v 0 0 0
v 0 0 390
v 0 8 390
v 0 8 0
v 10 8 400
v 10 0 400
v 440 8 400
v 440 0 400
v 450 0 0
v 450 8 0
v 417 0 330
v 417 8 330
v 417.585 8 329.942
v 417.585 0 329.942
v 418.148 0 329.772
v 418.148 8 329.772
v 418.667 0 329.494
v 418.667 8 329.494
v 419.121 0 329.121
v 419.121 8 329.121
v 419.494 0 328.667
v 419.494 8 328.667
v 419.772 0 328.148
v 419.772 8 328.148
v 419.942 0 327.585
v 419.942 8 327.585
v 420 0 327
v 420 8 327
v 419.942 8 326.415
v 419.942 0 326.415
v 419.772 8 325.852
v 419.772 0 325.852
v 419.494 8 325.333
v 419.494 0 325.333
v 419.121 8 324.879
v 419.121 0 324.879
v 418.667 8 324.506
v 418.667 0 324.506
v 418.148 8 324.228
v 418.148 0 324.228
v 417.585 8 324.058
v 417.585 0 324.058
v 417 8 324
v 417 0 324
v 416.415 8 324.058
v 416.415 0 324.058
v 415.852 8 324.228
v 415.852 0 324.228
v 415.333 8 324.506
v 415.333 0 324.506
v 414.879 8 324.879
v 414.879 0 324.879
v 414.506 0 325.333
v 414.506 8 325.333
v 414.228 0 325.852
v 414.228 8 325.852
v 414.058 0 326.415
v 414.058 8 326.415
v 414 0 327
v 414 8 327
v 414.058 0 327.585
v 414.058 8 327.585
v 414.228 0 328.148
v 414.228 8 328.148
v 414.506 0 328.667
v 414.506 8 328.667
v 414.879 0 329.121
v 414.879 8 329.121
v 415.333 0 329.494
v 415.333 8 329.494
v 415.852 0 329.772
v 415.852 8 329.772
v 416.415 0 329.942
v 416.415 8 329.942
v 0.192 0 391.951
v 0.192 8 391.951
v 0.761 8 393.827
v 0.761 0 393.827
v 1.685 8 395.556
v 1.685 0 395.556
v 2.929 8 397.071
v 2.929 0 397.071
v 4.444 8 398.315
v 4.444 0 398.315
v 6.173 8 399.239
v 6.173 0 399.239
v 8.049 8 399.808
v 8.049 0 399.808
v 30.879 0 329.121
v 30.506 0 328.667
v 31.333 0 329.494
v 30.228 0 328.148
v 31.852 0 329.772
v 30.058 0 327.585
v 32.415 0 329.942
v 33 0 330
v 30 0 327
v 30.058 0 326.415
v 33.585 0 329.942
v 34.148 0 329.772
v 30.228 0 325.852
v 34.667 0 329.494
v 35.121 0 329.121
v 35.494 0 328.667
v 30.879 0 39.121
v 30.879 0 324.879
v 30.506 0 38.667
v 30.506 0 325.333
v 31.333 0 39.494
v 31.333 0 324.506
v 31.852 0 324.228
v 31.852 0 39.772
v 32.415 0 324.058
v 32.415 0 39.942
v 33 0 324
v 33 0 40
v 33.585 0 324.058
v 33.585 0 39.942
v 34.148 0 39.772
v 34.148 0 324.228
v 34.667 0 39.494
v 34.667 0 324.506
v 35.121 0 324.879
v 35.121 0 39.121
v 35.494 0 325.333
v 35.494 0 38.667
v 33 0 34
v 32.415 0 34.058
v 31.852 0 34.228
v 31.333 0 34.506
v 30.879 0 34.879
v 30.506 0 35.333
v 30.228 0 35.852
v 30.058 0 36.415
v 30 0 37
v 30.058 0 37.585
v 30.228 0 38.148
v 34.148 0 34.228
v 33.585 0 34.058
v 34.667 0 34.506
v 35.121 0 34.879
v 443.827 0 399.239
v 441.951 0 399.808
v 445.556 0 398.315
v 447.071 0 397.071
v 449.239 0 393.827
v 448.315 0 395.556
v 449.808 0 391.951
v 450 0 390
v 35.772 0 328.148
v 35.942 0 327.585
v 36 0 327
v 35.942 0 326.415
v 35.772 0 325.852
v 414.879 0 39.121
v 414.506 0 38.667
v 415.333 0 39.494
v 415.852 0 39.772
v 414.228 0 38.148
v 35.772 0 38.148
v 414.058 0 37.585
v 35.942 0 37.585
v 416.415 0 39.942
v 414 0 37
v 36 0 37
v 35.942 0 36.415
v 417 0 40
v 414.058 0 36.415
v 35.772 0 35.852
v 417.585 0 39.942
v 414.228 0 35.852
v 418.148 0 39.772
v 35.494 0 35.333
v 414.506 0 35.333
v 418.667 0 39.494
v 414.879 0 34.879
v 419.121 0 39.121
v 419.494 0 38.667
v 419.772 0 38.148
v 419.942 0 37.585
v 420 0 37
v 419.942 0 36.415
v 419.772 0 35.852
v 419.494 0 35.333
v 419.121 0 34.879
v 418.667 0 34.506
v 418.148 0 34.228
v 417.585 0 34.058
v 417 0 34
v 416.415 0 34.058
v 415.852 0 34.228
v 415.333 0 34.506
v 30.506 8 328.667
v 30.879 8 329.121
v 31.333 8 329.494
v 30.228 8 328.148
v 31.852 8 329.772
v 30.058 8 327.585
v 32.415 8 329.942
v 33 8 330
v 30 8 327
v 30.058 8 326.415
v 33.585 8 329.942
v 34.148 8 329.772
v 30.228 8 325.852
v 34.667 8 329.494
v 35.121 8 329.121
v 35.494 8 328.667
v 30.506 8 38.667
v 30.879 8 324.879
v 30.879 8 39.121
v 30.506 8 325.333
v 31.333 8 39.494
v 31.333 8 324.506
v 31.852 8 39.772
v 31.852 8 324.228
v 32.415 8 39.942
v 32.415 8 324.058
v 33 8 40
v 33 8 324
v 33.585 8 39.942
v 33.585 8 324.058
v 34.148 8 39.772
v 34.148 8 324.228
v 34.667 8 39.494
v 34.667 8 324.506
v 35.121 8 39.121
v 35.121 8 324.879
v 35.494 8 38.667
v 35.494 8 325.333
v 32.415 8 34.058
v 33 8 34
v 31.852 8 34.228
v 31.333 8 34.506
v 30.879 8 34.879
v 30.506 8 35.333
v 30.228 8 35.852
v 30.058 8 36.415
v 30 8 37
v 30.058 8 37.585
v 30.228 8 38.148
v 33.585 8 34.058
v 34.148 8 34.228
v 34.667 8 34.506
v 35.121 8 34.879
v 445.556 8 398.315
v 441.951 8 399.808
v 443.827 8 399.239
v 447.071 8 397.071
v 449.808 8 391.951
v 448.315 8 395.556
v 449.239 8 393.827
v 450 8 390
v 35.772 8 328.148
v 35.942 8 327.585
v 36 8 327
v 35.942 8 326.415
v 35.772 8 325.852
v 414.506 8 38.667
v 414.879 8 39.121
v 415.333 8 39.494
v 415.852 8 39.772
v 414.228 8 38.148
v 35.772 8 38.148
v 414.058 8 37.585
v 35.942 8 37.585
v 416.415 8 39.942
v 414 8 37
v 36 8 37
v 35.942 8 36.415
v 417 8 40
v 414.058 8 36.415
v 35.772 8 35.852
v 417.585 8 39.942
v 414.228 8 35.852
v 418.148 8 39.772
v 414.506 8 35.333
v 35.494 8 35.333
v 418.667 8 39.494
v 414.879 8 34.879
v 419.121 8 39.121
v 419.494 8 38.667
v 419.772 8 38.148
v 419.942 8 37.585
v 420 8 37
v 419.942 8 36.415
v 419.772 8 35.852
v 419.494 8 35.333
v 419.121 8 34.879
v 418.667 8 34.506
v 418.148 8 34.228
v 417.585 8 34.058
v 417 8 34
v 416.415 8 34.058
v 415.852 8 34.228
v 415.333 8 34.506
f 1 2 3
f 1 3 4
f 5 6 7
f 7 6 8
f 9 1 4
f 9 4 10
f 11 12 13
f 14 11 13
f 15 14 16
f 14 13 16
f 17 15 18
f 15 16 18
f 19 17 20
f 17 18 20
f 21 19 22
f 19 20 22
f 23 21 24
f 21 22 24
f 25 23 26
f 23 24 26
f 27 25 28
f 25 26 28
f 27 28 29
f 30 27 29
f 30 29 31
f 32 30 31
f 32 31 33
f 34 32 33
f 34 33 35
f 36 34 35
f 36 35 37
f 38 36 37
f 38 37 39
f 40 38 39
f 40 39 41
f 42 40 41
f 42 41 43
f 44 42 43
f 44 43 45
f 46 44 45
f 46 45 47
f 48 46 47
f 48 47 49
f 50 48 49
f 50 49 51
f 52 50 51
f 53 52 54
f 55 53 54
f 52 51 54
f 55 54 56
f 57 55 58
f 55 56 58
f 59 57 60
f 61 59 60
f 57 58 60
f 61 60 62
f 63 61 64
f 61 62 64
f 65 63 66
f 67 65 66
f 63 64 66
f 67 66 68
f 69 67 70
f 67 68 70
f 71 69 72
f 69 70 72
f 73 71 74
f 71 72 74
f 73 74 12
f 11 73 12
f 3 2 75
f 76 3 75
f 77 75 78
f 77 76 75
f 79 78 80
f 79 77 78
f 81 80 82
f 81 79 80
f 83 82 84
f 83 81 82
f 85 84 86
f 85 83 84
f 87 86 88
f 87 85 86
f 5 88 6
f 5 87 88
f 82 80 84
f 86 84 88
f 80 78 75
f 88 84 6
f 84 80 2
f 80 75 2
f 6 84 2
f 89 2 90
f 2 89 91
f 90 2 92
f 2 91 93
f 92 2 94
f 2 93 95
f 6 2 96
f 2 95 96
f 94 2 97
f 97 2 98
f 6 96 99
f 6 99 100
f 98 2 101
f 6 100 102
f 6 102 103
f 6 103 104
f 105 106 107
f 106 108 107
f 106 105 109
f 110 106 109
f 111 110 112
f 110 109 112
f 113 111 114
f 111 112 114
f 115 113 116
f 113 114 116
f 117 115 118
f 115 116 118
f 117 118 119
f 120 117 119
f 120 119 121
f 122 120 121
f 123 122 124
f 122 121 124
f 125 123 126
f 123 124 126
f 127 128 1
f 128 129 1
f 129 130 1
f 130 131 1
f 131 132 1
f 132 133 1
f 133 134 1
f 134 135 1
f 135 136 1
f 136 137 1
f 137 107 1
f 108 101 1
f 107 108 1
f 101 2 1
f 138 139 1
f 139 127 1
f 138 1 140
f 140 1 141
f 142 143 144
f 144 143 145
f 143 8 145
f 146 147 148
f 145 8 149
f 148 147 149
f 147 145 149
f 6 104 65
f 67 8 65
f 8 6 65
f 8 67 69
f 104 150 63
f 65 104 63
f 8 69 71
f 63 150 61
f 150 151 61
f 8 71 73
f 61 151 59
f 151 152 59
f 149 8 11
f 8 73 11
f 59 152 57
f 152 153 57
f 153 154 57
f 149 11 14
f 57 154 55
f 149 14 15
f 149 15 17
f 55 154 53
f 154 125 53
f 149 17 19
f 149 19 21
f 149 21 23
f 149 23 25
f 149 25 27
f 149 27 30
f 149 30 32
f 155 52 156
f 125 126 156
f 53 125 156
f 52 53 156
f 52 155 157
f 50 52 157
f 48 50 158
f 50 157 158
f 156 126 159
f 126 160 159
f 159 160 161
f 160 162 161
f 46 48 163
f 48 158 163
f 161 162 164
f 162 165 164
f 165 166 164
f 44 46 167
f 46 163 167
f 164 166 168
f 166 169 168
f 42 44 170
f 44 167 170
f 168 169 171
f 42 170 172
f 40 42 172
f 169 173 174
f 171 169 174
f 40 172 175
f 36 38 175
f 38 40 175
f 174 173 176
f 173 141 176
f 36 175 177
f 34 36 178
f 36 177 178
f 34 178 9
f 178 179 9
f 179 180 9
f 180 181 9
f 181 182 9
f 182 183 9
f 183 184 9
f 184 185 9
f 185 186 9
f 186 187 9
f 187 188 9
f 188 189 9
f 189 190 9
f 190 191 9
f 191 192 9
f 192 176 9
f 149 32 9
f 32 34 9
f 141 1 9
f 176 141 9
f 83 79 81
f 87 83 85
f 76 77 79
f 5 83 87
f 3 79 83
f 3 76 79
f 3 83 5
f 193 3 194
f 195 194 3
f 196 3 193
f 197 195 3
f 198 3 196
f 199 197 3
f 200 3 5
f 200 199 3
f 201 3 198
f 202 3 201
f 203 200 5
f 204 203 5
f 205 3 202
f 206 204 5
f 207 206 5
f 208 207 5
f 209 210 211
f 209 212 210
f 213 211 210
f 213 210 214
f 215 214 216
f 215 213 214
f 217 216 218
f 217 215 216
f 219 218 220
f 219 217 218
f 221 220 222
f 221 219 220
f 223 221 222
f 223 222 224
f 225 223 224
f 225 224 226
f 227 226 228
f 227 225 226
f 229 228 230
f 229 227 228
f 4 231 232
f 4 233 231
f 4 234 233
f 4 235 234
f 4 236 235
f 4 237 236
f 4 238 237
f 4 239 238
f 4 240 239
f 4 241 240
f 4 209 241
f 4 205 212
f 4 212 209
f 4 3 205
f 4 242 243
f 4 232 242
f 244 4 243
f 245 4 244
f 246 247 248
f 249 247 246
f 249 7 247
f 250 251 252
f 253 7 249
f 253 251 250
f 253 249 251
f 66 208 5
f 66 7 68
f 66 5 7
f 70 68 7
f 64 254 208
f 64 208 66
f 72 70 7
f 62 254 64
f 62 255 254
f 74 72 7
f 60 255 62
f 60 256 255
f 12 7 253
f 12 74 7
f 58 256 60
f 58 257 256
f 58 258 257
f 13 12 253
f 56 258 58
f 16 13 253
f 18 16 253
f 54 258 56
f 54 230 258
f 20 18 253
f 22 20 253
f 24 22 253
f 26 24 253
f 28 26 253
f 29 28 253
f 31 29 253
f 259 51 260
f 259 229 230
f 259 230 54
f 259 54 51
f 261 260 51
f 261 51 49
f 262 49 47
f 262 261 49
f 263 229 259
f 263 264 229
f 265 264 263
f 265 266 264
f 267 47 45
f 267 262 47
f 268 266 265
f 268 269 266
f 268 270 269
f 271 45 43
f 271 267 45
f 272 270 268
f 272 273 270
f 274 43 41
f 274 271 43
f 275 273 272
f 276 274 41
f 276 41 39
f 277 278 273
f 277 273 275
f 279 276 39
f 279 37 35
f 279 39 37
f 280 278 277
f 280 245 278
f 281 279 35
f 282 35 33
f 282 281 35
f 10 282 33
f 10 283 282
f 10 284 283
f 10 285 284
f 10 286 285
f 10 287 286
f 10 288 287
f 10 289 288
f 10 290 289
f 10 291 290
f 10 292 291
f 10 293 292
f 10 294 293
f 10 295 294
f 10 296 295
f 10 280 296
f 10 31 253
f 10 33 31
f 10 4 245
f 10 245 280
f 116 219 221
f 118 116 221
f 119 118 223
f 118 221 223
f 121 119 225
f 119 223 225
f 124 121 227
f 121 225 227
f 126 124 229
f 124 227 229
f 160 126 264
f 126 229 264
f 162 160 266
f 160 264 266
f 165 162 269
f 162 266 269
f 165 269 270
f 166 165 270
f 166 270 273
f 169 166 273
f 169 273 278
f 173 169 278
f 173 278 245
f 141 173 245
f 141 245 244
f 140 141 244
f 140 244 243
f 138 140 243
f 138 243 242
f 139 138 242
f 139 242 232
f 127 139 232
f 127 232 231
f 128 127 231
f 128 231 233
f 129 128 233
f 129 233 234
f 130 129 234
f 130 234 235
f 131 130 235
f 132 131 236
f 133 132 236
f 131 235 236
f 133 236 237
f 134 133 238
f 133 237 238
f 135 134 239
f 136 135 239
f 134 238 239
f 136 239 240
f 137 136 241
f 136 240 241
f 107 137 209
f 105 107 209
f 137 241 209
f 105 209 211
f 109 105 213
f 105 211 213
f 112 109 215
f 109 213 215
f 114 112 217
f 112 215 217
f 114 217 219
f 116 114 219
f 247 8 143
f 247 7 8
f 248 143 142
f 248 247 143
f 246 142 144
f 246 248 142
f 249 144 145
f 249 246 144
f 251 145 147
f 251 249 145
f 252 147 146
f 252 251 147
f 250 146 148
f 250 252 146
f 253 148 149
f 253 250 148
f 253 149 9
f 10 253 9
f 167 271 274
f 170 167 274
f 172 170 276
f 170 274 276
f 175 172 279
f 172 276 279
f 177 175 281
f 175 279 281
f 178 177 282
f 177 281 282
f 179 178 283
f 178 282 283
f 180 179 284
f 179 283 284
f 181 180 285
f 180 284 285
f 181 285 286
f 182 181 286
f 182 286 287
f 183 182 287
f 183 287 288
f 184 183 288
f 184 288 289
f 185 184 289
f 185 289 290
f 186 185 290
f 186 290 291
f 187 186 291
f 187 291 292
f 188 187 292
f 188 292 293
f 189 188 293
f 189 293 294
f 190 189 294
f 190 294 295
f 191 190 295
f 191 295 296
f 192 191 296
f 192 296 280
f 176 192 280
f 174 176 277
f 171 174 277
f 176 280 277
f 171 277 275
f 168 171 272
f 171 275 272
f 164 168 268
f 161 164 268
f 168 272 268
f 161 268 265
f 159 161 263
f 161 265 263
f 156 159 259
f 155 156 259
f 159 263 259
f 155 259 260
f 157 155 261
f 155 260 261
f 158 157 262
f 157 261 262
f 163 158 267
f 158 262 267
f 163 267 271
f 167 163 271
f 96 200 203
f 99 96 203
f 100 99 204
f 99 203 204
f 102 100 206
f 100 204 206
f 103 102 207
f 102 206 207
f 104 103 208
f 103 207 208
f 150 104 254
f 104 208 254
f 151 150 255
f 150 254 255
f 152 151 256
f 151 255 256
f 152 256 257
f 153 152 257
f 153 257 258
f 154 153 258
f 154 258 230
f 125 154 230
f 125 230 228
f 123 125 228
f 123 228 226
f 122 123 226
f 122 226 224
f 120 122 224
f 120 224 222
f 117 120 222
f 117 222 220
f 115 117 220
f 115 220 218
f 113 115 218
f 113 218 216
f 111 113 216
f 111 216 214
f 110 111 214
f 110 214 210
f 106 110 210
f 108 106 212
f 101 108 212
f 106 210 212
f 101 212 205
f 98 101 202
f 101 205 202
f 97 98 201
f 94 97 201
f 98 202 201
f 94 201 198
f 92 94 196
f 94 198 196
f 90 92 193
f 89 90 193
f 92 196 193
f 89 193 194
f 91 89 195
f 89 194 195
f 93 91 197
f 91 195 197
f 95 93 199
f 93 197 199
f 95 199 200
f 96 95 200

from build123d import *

# Parameters (mm, degrees)
SKETCH1_W      = 450
SKETCH1_H      = 400
EXTRUDE1_DEPTH = 8
SKETCH2_R      = 3
EXTRUDE2_DEPTH = 603.132875701
FILLET1_R      = 10


with BuildPart() as part:
    # Sketch1 → Extrude1 (new body)
    with BuildSketch(Plane(origin=(0, 0, 0), x_dir=(1, 0, 0), z_dir=(0, 1, 0))):
        with Locations((225, -200)):
            Rectangle(SKETCH1_W, SKETCH1_H)
    extrude(amount=EXTRUDE1_DEPTH)

    # Sketch2 → Extrude2 (cut, through all)
    with BuildSketch(Plane(origin=(0, 8, 0), x_dir=(-1, 0, 0), z_dir=(0, 1, 0))):
        with Locations(Location((-33, 37, 0), (0, 0, 90))):
            Circle(SKETCH2_R)
        with Locations(Location((-33, 327, 0), (0, 0, 90))):
            Circle(SKETCH2_R)
        with Locations(Location((-417, 37, 0), (0, 0, 90))):
            Circle(SKETCH2_R)
        with Locations(Location((-417, 327, 0), (0, 0, 90))):
            Circle(SKETCH2_R)
    extrude(amount=-EXTRUDE2_DEPTH, mode=Mode.SUBTRACT)

    # Fillet1
    fillet1_edges = [part.edges().sort_by_distance(p)[0] for p in [
        (450, 4, 400),
        (0, 4, 400),
    ]]
    fillet(fillet1_edges, radius=FILLET1_R)


solid = part.part
